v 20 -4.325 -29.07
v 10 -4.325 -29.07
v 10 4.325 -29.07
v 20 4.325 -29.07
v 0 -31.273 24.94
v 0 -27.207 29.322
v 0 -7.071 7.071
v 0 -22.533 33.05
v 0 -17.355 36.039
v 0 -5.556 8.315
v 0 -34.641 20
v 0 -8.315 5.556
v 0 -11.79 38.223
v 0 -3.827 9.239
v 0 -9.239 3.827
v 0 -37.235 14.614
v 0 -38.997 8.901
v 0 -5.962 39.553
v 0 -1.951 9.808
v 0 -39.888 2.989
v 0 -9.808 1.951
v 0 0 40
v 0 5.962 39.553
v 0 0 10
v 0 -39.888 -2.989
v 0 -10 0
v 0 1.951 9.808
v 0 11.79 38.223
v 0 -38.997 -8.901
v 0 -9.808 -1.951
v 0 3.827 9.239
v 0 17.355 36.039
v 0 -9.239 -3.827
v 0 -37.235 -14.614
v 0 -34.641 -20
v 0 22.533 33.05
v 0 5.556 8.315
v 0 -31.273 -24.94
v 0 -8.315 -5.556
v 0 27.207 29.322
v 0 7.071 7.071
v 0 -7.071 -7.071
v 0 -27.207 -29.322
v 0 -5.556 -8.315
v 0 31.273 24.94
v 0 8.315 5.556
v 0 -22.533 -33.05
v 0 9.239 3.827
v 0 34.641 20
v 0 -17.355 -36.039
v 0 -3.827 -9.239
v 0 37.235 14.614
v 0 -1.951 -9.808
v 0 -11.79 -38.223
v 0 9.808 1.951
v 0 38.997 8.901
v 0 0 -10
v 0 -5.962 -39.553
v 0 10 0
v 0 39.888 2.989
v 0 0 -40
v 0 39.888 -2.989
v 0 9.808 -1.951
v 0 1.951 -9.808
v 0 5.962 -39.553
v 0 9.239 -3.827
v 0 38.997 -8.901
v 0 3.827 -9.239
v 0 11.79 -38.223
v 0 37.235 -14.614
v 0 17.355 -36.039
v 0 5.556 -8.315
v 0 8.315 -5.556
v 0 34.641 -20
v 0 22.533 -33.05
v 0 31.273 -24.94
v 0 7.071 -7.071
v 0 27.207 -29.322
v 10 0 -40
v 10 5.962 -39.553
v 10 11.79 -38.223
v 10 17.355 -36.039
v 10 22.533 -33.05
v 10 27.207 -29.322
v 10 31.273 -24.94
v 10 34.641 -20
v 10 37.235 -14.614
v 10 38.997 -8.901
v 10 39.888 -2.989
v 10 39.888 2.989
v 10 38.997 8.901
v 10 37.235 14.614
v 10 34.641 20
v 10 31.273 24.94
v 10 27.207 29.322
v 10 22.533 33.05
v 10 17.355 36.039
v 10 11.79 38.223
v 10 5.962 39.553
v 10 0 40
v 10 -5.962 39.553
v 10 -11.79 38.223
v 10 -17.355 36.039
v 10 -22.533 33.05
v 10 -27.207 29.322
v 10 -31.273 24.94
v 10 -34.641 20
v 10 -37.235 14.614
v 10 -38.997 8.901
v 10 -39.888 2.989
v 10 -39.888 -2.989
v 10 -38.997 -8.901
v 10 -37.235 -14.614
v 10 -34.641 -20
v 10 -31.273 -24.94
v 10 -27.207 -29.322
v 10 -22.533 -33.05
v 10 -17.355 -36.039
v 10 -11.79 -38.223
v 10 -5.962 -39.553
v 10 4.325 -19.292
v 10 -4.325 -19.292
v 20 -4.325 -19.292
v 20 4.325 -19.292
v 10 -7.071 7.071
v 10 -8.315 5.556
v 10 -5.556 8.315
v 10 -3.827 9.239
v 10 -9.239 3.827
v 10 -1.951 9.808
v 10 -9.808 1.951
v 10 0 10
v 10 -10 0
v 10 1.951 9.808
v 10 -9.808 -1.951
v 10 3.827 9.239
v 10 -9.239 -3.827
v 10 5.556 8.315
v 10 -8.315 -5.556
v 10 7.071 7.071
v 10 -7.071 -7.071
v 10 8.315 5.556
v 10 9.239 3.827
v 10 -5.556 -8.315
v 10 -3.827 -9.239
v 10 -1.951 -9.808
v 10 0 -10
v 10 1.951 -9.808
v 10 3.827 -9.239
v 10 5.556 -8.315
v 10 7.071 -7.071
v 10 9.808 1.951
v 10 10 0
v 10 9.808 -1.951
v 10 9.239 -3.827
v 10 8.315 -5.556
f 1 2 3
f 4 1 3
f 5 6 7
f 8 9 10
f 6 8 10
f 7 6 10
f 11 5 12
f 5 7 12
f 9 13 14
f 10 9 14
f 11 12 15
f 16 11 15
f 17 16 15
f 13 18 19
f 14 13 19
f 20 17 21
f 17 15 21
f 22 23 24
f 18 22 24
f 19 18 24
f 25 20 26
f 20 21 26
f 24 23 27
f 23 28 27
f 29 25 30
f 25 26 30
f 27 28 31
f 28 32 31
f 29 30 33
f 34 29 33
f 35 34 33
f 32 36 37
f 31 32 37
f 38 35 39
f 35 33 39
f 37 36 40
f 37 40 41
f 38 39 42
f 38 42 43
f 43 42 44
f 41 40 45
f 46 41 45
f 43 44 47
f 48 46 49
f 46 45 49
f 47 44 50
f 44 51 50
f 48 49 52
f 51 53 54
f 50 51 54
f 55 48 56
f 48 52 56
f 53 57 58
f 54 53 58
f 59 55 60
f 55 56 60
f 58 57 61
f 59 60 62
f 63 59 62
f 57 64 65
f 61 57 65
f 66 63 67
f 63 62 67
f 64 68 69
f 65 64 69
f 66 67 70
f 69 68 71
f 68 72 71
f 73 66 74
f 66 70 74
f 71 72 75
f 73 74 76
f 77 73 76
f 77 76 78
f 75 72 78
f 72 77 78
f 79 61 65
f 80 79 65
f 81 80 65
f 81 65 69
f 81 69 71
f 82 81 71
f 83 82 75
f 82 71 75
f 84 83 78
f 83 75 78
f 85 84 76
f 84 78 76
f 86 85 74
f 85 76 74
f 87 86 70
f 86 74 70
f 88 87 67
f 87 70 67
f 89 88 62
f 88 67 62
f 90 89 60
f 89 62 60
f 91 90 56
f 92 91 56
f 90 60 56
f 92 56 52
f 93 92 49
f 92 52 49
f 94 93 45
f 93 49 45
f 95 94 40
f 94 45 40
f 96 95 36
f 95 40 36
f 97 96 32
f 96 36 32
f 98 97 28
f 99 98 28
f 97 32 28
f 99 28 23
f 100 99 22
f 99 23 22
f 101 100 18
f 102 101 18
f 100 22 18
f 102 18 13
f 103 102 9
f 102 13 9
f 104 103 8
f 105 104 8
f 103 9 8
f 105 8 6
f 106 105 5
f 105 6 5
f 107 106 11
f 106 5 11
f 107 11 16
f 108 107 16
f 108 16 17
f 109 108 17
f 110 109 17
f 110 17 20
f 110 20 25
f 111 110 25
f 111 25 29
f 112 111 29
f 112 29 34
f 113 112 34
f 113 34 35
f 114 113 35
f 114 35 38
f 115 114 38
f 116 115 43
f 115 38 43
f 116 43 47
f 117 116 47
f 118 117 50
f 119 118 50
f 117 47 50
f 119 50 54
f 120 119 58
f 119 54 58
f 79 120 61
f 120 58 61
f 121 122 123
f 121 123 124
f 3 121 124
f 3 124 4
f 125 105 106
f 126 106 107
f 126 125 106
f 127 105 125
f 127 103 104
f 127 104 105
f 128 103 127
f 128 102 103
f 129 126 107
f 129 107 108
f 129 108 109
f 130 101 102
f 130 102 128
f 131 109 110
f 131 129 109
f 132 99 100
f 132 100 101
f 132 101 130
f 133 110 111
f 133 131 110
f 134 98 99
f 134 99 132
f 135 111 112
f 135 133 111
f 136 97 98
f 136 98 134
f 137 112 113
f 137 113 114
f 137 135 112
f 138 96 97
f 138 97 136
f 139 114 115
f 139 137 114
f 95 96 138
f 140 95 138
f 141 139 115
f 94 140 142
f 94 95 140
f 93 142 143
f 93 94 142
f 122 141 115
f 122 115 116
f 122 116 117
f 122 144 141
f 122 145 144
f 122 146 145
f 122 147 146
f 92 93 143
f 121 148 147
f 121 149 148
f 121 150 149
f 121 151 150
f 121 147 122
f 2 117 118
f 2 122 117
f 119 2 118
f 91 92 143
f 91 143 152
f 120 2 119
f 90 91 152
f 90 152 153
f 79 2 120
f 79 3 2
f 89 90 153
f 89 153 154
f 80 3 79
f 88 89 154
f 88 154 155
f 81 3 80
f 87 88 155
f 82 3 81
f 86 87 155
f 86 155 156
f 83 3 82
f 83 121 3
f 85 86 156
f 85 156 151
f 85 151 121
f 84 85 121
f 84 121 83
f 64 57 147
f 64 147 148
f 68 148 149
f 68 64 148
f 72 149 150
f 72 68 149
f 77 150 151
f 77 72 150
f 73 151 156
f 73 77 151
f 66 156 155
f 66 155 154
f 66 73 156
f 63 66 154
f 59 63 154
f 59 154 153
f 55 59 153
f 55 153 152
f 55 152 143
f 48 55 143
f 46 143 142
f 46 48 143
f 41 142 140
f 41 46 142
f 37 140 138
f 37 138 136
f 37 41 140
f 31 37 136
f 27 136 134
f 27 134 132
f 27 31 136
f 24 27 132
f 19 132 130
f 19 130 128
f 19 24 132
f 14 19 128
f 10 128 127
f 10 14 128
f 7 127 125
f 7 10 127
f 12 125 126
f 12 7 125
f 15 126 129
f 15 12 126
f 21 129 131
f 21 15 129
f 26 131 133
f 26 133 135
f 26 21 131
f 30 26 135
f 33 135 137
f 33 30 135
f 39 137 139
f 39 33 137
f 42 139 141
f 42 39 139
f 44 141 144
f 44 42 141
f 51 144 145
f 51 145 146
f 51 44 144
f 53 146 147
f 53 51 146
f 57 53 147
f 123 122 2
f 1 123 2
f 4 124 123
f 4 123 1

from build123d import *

# Parameters (mm, degrees)
SKETCH_1_R      = 40
SKETCH_1_R_2    = 10
EXTRUDE_1_DEPTH = 10
SKETCH_2_W      = 9.777839157
SKETCH_2_H      = 8.649626946
EXTRUDE_2_DEPTH = 10


with BuildPart() as part:
    # 草图1 → 凸台-拉伸1 (new body)
    with BuildSketch(Plane(origin=(0, 0, 0), x_dir=(0, 0, -1), z_dir=(1, 0, 0))):
        Circle(SKETCH_1_R)
        Circle(SKETCH_1_R_2, mode=Mode.SUBTRACT)
    extrude(amount=EXTRUDE_1_DEPTH)

    # 草图2 → 凸台-拉伸2 (add)
    with BuildSketch(Plane(origin=(10, 0, 0), x_dir=(0, 0, -1), z_dir=(1, 0, 0))):
        with Locations((24.181348377, 0)):
            Rectangle(SKETCH_2_W, SKETCH_2_H)
    extrude(amount=EXTRUDE_2_DEPTH)


solid = part.part
